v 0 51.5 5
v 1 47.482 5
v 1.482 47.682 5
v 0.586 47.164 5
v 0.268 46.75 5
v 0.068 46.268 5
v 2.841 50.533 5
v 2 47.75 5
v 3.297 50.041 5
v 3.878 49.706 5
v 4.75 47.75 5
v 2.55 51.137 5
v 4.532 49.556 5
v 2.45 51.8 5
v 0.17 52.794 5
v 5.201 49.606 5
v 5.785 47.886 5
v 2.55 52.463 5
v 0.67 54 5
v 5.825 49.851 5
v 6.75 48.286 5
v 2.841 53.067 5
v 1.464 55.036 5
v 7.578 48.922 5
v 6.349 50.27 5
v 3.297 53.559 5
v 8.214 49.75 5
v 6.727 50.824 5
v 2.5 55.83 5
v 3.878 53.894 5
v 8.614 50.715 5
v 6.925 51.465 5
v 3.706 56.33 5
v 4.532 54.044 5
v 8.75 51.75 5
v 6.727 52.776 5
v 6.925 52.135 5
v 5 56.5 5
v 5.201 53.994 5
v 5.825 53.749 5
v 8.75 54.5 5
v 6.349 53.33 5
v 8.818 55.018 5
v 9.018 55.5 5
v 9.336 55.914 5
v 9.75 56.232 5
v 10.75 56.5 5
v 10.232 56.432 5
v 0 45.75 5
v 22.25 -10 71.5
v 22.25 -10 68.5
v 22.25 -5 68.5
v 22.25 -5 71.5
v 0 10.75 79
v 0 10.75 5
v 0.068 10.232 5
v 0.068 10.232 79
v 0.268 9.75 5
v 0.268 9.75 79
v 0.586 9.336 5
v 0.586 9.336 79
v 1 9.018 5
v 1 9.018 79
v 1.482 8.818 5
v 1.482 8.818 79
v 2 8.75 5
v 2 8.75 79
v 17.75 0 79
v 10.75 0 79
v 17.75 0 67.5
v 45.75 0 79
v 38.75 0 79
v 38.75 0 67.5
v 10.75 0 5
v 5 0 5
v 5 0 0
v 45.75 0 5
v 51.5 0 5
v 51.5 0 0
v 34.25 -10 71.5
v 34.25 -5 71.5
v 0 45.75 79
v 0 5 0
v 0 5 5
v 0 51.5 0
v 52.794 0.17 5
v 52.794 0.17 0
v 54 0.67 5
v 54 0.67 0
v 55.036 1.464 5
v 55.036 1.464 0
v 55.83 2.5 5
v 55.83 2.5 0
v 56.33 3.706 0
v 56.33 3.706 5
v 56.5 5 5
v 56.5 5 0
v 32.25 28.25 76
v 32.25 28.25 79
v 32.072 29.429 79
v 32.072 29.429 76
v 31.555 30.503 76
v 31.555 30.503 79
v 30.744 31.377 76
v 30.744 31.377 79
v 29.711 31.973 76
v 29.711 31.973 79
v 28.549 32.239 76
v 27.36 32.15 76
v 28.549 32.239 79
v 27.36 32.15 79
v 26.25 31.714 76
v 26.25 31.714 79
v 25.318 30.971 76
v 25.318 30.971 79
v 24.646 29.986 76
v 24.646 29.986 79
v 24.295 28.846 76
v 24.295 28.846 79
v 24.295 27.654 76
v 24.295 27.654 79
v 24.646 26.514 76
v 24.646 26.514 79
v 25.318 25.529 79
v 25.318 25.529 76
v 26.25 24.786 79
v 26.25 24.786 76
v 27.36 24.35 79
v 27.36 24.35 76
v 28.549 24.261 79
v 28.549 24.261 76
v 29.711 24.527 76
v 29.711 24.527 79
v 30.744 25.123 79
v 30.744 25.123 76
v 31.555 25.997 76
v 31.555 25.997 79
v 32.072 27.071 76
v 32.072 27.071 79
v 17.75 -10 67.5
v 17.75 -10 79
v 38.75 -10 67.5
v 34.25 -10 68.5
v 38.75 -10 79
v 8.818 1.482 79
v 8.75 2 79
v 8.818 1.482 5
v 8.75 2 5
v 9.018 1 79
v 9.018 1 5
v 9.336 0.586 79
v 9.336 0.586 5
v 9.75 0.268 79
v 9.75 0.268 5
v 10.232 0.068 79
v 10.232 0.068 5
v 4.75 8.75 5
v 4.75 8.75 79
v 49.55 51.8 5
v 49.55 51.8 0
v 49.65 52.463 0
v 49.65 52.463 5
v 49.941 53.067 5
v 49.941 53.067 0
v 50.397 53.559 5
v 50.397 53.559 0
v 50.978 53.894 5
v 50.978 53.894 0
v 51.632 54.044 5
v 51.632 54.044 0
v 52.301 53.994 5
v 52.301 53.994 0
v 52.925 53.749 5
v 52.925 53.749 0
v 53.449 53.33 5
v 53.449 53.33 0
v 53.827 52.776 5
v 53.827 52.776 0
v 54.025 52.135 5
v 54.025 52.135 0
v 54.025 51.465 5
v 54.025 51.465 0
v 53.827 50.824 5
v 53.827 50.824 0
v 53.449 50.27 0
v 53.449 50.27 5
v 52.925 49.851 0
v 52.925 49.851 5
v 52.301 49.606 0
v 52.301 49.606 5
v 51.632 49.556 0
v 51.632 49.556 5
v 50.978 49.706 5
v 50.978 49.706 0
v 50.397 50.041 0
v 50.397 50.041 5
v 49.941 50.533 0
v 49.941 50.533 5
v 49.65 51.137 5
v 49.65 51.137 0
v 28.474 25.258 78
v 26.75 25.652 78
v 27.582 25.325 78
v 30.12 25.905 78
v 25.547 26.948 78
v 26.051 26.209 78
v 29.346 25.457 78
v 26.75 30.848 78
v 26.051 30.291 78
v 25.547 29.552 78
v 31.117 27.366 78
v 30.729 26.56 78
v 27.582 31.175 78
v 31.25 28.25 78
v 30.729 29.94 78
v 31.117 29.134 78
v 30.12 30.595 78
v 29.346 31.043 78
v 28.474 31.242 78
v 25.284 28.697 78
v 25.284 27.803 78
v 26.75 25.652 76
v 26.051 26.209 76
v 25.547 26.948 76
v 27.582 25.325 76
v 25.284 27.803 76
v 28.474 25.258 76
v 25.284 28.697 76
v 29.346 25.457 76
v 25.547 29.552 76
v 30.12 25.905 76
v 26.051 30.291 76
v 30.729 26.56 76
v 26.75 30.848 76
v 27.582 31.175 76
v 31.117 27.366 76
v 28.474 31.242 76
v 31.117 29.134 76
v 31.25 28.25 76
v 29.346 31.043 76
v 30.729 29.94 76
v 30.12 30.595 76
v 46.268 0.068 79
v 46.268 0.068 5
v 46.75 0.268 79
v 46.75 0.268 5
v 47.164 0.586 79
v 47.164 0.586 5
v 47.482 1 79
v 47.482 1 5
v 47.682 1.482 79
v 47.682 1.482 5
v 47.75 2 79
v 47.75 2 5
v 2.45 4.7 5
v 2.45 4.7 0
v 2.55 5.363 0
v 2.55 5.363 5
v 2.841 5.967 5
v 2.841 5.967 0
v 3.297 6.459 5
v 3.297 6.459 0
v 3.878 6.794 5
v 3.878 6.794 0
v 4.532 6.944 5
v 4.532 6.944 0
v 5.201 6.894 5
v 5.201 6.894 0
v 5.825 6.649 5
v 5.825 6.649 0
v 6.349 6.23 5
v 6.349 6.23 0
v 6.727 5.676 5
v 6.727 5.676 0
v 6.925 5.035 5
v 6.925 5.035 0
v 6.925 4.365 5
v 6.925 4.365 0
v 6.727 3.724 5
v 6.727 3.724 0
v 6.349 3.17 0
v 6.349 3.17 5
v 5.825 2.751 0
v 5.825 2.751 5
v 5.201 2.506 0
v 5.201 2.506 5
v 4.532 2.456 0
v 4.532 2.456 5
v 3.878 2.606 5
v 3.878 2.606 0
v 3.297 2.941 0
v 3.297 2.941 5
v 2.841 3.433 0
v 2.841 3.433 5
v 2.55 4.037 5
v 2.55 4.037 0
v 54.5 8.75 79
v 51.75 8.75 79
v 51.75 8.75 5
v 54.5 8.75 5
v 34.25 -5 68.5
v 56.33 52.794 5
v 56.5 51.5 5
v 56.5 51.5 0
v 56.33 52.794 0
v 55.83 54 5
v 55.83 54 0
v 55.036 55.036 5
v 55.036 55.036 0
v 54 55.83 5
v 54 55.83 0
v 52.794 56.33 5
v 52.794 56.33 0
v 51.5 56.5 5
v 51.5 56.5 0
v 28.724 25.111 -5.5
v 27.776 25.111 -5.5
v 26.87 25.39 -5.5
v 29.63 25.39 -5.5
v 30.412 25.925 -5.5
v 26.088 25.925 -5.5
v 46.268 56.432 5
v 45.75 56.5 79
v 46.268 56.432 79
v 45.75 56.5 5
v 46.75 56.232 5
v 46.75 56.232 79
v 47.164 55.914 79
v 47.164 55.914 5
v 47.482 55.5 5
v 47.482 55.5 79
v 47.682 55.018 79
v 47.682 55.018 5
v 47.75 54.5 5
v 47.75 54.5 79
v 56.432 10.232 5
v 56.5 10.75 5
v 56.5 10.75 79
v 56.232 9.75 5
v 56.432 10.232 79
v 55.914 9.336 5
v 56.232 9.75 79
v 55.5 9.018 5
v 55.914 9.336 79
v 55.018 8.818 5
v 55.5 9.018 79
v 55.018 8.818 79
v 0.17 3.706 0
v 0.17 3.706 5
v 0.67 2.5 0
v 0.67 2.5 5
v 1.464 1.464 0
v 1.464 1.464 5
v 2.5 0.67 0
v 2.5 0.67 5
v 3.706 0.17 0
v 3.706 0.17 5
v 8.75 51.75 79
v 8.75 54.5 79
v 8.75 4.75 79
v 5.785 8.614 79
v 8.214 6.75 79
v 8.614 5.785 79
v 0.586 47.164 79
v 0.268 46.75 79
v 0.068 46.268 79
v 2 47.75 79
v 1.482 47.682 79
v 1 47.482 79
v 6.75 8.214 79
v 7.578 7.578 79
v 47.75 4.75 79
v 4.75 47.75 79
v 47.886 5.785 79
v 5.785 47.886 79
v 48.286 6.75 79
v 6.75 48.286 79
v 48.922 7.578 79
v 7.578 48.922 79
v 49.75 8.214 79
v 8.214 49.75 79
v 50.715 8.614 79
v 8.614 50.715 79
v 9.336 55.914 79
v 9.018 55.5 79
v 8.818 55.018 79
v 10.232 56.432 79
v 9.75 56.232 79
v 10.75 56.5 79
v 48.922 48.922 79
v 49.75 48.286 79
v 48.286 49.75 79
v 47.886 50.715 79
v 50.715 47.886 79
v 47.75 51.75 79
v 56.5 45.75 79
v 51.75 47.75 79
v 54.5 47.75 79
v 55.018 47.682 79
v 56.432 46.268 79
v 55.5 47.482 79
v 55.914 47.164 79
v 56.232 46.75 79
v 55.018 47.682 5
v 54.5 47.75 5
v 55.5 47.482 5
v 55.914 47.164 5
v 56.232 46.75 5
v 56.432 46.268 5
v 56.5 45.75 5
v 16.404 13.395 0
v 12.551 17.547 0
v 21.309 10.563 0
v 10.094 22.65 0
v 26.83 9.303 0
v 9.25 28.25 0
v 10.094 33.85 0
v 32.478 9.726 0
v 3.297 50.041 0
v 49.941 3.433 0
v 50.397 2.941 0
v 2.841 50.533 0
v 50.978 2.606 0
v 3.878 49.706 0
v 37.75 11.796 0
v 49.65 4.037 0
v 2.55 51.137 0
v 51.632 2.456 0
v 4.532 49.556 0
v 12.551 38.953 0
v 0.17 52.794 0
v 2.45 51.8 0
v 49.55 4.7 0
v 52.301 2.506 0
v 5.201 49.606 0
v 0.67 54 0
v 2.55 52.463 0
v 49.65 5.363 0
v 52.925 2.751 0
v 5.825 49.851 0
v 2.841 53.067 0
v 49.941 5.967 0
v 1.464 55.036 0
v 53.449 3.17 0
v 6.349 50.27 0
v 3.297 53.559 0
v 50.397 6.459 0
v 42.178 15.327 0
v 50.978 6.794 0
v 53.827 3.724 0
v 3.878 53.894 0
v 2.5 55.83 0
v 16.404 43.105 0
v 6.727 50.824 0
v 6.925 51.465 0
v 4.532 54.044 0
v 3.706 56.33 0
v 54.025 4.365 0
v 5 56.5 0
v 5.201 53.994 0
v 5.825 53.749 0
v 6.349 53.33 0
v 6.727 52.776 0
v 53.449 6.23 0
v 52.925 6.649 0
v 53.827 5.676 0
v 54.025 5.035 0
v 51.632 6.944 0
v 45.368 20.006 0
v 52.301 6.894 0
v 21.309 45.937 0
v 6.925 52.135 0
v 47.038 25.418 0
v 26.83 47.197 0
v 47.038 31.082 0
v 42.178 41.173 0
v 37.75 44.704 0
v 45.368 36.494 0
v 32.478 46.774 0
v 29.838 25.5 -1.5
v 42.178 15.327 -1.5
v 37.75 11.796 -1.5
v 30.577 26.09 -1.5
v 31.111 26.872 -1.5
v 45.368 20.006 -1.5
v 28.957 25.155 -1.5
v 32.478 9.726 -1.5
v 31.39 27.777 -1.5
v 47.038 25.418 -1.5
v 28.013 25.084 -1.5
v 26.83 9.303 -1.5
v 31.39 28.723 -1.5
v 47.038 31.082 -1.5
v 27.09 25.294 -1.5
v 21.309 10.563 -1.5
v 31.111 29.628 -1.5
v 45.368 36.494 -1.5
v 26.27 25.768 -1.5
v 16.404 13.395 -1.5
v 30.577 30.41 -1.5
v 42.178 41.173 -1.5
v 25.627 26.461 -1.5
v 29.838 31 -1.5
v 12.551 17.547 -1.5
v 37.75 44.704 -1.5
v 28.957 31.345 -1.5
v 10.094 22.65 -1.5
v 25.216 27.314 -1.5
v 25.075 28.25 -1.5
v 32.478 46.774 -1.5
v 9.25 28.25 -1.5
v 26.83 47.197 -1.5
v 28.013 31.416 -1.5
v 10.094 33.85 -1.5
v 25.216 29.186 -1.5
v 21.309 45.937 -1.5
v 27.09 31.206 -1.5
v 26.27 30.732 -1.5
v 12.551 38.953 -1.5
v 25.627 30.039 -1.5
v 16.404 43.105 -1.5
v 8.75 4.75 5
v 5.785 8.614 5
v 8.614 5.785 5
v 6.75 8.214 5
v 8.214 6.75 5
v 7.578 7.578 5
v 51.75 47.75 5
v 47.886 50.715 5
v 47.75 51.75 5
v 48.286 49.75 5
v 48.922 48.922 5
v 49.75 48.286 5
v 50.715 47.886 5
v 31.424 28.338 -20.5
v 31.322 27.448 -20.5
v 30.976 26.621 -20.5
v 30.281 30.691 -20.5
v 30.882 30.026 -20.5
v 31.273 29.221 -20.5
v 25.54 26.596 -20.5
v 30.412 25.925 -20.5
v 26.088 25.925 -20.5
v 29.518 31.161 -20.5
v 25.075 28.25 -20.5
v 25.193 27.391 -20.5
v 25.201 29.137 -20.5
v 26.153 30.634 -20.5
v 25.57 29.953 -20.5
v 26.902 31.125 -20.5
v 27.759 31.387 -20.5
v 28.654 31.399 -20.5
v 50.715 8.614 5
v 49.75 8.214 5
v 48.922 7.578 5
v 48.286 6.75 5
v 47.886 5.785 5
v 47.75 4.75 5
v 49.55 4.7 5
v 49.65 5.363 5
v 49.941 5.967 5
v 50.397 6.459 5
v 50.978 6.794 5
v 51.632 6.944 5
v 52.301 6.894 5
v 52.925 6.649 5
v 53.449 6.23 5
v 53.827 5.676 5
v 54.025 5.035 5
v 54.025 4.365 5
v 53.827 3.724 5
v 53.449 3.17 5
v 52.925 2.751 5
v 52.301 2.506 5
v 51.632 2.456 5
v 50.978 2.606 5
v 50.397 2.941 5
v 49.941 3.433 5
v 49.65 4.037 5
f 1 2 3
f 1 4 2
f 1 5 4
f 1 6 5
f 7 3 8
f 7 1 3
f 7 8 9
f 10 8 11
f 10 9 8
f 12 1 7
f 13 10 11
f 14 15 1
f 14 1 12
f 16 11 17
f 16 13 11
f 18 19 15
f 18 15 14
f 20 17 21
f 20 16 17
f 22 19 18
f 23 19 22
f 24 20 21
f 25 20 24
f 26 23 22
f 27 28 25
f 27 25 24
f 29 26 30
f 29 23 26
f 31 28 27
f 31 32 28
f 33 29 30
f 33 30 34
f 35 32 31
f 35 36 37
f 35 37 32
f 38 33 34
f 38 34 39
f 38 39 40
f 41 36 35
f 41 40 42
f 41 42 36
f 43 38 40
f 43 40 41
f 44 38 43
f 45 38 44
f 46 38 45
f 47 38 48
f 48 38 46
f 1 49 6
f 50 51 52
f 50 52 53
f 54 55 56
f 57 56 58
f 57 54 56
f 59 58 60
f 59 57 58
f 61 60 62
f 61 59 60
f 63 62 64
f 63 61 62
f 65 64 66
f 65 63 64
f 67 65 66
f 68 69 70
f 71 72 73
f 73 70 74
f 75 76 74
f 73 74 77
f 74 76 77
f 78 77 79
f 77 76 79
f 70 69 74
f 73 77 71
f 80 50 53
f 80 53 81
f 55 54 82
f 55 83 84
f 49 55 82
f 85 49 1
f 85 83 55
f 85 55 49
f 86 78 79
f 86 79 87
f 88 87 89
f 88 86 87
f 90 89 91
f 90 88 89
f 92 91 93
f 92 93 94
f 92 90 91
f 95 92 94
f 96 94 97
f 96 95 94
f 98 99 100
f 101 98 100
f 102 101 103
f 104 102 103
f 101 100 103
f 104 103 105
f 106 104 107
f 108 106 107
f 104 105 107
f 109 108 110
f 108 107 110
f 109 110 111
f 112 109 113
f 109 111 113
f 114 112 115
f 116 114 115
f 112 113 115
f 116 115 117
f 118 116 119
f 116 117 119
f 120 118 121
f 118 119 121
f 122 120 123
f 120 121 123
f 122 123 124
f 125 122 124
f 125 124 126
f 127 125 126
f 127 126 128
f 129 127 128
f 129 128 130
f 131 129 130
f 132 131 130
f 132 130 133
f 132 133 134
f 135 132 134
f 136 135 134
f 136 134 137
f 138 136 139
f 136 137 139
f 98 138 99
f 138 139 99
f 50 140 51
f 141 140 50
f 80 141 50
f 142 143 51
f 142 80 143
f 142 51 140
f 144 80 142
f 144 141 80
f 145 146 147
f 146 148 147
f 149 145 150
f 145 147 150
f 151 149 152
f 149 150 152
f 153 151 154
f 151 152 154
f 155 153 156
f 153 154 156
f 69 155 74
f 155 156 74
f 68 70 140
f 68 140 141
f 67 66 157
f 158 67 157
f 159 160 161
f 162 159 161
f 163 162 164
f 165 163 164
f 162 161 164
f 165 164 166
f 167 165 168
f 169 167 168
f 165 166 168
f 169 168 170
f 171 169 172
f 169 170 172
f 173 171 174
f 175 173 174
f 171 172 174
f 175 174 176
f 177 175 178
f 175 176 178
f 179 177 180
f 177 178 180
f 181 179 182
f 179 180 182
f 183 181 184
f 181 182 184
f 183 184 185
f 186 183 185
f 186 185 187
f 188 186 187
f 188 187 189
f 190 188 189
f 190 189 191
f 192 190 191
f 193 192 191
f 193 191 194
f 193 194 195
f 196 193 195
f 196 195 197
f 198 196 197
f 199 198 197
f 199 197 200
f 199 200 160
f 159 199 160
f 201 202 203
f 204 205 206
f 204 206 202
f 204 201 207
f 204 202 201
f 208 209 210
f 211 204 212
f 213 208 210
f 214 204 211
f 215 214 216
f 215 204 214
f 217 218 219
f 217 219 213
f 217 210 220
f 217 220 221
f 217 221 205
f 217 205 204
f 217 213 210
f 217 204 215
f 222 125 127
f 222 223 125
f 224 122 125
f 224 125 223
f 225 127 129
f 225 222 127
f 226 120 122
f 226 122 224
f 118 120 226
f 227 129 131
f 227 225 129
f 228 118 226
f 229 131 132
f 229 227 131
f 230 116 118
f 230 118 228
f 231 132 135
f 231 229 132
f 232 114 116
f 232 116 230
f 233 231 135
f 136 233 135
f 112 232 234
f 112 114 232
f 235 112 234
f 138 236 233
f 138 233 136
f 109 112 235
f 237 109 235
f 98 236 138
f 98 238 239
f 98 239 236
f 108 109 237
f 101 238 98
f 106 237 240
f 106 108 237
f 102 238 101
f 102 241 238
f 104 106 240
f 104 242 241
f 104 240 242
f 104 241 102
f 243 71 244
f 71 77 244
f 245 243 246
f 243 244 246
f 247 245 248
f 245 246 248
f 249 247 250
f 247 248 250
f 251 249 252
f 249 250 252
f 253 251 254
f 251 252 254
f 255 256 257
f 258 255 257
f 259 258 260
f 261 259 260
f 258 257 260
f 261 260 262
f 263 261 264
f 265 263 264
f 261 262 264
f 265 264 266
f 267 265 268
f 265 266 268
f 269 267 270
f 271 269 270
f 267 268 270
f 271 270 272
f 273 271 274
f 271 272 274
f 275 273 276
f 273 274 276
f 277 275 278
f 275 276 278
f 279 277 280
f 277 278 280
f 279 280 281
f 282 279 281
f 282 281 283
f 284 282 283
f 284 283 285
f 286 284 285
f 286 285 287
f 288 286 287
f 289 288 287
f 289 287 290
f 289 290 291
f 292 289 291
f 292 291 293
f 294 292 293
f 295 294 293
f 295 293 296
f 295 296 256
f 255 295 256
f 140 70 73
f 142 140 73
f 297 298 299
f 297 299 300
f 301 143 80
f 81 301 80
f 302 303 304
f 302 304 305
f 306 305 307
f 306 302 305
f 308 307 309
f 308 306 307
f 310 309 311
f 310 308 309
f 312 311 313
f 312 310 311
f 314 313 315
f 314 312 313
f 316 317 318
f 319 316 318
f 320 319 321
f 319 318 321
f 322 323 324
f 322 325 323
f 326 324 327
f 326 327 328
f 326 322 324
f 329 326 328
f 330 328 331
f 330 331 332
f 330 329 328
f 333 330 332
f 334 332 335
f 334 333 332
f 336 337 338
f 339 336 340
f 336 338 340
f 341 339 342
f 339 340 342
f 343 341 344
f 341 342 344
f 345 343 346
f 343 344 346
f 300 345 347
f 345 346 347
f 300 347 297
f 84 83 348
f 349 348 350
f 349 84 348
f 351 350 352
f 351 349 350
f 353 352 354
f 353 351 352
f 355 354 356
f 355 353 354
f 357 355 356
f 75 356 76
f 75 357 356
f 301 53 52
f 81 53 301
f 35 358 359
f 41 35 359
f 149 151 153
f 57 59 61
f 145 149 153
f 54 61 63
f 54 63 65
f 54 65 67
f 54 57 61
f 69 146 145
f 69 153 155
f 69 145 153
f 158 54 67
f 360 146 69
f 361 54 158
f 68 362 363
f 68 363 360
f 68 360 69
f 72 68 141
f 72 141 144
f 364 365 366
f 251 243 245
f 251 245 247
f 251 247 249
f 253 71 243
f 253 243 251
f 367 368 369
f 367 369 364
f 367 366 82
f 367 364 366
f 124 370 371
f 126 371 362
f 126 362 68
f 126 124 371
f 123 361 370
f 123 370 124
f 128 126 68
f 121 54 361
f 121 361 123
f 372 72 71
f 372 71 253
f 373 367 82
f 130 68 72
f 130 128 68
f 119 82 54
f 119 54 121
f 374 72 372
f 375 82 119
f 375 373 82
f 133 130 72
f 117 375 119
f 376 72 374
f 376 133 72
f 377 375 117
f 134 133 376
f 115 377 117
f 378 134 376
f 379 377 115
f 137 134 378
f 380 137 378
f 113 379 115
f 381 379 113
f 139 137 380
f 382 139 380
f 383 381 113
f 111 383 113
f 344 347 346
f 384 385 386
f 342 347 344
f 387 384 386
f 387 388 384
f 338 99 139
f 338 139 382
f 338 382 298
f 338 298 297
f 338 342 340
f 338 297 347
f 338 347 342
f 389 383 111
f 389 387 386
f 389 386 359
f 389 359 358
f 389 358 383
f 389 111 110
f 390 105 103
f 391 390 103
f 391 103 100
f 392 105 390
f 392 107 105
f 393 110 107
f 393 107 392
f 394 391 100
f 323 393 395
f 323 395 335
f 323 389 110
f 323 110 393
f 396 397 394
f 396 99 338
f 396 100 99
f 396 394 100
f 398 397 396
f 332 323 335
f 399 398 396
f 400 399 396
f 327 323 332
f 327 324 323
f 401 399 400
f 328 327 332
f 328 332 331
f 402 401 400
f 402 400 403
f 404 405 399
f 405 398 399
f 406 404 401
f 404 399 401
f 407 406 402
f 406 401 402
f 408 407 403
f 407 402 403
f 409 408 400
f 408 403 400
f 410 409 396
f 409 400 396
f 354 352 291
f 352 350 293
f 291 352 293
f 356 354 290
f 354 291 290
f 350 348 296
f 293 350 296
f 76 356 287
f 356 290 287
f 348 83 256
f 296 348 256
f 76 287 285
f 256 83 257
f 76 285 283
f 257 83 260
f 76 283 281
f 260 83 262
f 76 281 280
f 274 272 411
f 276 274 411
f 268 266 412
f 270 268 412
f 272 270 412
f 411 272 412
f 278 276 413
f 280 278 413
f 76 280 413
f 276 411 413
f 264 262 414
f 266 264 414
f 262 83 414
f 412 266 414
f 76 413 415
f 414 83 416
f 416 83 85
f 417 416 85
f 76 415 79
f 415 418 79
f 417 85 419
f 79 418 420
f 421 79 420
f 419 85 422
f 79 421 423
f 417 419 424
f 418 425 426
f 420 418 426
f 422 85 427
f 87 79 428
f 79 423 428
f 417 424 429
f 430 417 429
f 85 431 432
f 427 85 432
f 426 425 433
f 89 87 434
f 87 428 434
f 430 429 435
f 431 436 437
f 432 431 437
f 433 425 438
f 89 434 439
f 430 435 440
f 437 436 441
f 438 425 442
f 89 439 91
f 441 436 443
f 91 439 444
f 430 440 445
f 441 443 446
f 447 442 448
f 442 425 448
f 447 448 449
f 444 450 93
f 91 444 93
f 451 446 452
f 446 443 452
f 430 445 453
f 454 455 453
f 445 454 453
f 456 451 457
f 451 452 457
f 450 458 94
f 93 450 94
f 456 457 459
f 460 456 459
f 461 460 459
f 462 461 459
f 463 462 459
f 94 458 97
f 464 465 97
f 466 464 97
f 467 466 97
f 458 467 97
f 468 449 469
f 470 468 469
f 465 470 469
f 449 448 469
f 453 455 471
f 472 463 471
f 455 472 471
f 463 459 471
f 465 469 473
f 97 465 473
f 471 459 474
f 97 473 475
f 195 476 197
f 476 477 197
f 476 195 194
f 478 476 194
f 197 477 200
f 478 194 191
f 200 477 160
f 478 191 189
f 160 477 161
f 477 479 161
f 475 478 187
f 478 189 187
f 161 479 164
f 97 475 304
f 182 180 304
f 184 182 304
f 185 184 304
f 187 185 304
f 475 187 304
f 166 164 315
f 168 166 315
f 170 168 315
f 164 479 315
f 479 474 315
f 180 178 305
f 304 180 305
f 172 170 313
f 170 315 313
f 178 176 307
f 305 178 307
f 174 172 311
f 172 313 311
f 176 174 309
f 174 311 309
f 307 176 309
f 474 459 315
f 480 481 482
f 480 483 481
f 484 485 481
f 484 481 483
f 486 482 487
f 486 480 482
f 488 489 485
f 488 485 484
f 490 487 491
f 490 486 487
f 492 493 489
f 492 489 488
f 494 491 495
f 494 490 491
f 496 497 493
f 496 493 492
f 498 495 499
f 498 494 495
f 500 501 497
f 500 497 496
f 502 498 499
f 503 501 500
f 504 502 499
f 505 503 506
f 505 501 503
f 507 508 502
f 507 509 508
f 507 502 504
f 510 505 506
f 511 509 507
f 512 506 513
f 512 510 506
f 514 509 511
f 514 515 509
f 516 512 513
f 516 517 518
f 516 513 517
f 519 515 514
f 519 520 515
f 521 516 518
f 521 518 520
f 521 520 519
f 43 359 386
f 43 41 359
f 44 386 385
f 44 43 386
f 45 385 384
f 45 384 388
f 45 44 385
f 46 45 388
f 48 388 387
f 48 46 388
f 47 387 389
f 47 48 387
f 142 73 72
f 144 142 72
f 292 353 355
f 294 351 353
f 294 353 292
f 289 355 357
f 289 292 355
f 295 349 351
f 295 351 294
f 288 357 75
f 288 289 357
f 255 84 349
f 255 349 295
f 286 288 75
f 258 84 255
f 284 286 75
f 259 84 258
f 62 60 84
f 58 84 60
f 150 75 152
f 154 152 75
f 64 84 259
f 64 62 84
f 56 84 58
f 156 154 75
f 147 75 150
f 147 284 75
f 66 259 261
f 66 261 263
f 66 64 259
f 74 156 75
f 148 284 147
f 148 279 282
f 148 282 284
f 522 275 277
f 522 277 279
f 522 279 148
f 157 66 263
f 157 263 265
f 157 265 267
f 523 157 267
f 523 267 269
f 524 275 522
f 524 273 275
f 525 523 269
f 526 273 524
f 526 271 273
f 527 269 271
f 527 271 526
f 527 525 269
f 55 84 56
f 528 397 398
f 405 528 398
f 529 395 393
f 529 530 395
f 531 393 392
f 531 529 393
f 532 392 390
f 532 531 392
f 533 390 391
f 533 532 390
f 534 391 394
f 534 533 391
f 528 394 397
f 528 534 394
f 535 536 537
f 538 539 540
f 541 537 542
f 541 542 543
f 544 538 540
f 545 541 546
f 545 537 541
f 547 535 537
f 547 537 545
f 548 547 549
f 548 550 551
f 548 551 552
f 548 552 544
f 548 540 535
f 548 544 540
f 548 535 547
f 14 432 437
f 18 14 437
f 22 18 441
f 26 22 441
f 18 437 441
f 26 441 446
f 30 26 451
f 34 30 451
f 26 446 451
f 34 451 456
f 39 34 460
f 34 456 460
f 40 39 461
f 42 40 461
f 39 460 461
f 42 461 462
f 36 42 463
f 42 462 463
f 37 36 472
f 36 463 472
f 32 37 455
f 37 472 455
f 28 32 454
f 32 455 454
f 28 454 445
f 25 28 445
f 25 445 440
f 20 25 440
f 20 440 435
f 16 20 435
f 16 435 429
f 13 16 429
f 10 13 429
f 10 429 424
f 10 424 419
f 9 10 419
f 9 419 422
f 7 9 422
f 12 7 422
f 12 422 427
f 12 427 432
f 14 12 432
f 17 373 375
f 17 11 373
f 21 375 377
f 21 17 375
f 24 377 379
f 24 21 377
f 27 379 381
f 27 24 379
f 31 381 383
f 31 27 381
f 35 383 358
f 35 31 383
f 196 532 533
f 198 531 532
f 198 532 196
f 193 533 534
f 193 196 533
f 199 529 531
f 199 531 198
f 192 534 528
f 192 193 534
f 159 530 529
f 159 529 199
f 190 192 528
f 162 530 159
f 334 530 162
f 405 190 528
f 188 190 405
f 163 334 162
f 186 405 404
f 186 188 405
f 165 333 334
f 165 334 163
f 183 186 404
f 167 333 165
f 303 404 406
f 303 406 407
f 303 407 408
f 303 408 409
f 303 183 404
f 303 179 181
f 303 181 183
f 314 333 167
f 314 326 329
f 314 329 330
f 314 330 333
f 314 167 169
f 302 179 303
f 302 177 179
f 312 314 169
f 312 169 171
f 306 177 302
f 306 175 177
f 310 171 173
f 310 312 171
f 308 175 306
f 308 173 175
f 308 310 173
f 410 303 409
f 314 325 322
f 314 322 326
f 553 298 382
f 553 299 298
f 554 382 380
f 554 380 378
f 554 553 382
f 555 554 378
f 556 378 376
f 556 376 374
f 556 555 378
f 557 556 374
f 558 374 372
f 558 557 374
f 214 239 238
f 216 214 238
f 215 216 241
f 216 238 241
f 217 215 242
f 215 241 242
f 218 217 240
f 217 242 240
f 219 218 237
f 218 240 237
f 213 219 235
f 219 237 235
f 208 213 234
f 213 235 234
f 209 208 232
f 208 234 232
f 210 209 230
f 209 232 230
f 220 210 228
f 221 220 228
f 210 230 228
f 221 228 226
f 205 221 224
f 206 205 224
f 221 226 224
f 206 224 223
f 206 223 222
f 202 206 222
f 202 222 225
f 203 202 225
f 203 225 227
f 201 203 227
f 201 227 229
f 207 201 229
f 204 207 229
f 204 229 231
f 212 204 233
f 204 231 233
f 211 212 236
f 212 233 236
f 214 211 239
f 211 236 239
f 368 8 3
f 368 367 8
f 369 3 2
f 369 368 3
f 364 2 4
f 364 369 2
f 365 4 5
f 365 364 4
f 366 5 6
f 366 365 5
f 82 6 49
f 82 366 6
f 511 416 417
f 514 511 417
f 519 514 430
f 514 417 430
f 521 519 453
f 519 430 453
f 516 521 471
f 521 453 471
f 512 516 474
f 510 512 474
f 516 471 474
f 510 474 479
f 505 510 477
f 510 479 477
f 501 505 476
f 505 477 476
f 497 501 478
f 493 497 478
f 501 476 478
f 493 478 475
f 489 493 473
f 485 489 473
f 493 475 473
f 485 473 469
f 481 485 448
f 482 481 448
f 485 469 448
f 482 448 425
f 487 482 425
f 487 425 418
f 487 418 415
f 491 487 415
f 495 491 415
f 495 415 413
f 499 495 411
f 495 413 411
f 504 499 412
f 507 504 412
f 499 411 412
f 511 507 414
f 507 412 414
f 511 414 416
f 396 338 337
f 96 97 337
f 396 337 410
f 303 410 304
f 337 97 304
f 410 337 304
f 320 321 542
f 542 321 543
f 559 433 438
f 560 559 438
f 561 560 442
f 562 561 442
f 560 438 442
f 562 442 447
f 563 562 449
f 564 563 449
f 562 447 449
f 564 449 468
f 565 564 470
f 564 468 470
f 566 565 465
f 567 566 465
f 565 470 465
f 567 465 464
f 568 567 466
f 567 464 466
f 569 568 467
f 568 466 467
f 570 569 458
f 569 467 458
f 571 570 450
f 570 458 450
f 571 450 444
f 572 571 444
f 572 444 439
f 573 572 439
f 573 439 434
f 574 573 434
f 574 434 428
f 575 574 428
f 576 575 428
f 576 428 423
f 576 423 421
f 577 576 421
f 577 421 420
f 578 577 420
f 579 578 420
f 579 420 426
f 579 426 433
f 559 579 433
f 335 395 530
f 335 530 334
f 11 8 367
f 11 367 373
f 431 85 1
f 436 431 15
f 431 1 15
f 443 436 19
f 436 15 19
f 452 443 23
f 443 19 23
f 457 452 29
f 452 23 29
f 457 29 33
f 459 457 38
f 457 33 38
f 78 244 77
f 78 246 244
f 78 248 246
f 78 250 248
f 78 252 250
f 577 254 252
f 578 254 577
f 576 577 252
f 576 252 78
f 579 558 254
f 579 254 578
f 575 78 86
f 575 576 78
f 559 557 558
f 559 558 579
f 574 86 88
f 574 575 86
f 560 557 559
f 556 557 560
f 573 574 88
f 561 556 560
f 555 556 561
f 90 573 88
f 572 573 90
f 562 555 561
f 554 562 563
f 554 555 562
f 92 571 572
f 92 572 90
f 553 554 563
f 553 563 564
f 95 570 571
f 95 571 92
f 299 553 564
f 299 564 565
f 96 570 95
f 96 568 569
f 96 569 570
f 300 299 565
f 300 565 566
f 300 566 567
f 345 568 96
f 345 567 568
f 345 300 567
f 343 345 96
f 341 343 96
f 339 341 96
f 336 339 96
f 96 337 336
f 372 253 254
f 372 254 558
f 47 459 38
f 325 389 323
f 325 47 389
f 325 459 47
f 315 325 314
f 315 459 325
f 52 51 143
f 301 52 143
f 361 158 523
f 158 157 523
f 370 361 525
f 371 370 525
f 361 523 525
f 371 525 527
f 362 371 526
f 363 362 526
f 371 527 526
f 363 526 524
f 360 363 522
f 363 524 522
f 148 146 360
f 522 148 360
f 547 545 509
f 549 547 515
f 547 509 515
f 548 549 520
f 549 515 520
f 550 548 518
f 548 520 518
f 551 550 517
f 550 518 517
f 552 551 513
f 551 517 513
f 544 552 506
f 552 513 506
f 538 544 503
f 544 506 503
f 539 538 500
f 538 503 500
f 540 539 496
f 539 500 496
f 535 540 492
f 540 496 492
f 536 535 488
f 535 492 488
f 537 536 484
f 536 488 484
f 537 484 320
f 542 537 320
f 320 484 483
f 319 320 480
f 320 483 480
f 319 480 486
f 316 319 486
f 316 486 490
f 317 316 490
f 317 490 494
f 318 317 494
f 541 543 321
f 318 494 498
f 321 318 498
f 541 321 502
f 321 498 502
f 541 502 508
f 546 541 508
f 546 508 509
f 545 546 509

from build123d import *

# Parameters (mm, degrees)
SKETCH_1_W          = 56.5
SKETCH_1_H          = 56.5
EXTRUDE_1_DEPTH     = 79
FILLET_1_R          = 5
SKETCH_2_W          = 27.937414654
SKETCH_2_H          = 17.525111135
CUT_EXTRUDE_1_DEPTH = 74
FILLET_2_R          = 4
FILLET_3_R          = 2
SKETCH_3_R          = 19
EXTRUDE_2_DEPTH     = 1.5
SKETCH_4_R          = 4
CUT_EXTRUDE_2_DEPTH = 3
SKETCH_5_R          = 3
EXTRUDE_3_DEPTH     = 2
SKETCH_6_R          = 3.175
EXTRUDE_4_DEPTH     = 19
SKETCH_7_R          = 2.25
CUT_EXTRUDE_3_DEPTH = 21
SKETCH_8_W          = 21
SKETCH_8_H          = 11.5
EXTRUDE_5_DEPTH     = 10
SKETCH_9_W          = 12
SKETCH_9_H          = 3
CUT_EXTRUDE_4_DEPTH = 5
SKETCH_10_W         = 15
SKETCH_10_H         = 3.472611371
CUT_EXTRUDE_6_DEPTH = 113.36325022


with BuildPart() as part:
    # 草图1 → 凸台-拉伸1 (new body)
    with BuildSketch(Plane.XY):
        with Locations((28.25, 28.25)):
            Rectangle(SKETCH_1_W, SKETCH_1_H)
    extrude(amount=EXTRUDE_1_DEPTH)

    # 圆角1
    fillet_1_edges = [part.edges().sort_by_distance(p)[0] for p in [
        (0, 56.5, 39.5),
        (56.5, 56.5, 39.5),
        (56.5, 0, 39.5),
        (0, 0, 39.5),
    ]]
    fillet(fillet_1_edges, radius=FILLET_1_R)

    # 草图2 → 切除-拉伸1 (cut)
    with BuildSketch(Plane.XY.offset(79)):
        with Locations((-5.218707327, 56.512555568)):
            Rectangle(SKETCH_2_W, SKETCH_2_H)
        with Locations((61.718707327, 56.512555568)):
            Rectangle(SKETCH_2_W, SKETCH_2_H)
        with Locations((61.718707327, -0.012555568)):
            Rectangle(SKETCH_2_W, SKETCH_2_H)
        with Locations((-5.218707327, -0.012555568)):
            Rectangle(SKETCH_2_W, SKETCH_2_H)
    extrude(amount=-CUT_EXTRUDE_1_DEPTH, mode=Mode.SUBTRACT)

    # 圆角2
    fillet_2_edges = [part.edges().sort_by_distance(p)[0] for p in [
        (8.75, 47.75, 42),
        (47.75, 47.75, 42),
        (47.75, 8.75, 42),
        (8.75, 8.75, 42),
    ]]
    fillet(fillet_2_edges, radius=FILLET_2_R)

    # 圆角3
    fillet_3_edges = [part.edges().sort_by_distance(p)[0] for p in [
        (8.75, 56.5, 42),
        (0, 47.75, 42),
        (56.5, 47.75, 42),
        (47.75, 56.5, 42),
        (47.75, 0, 42),
        (56.5, 8.75, 42),
        (0, 8.75, 42),
        (8.75, 0, 42),
    ]]
    fillet(fillet_3_edges, radius=FILLET_3_R)

    # 草图3 → 凸台-拉伸2 (add)
    with BuildSketch(Plane(origin=(0, 0, 0), x_dir=(-1, 0, 0), z_dir=(0, 0, -1))):
        with Locations((-28.25, 28.25)):
            Circle(SKETCH_3_R)
    extrude(amount=EXTRUDE_2_DEPTH)

    # 草图4 → 切除-拉伸2 (cut)
    with BuildSketch(Plane.XY.offset(79)):
        with Locations((28.25, 28.25)):
            Circle(SKETCH_4_R)
    extrude(amount=-CUT_EXTRUDE_2_DEPTH, mode=Mode.SUBTRACT)

    # 草图5 → 凸台-拉伸3 (add)
    with BuildSketch(Plane.XY.offset(76)):
        with Locations((28.25, 28.25)):
            Circle(SKETCH_5_R)
    extrude(amount=EXTRUDE_3_DEPTH)

    # 草图6 → 凸台-拉伸4 (add)
    with BuildSketch(Plane(origin=(0, 0, -1.5), x_dir=(-1, 0, 0), z_dir=(0, 0, -1))):
        with Locations((-28.25, 28.25)):
            Circle(SKETCH_6_R)
    extrude(amount=EXTRUDE_4_DEPTH)

    # 草图7 → 切除-拉伸3 (cut)
    with BuildSketch(Plane(origin=(0, 0, 0), x_dir=(-1, 0, 0), z_dir=(0, 0, -1))):
        with Locations((-51.8, 4.7)):
            Circle(SKETCH_7_R)
        with Locations((-4.7, 4.7)):
            Circle(SKETCH_7_R)
        with Locations((-4.7, 51.8)):
            Circle(SKETCH_7_R)
        with Locations((-51.8, 51.8)):
            Circle(SKETCH_7_R)
    extrude(amount=-CUT_EXTRUDE_3_DEPTH, mode=Mode.SUBTRACT)

    # 草图8 → 凸台-拉伸5 (add)
    with BuildSketch(Plane.XZ):
        with Locations((28.25, 73.25)):
            Rectangle(SKETCH_8_W, SKETCH_8_H)
    extrude(amount=EXTRUDE_5_DEPTH)

    # 草图9 → 切除-拉伸4 (cut)
    with BuildSketch(Plane.XZ.offset(10)):
        with Locations((28.25, 70)):
            Rectangle(SKETCH_9_W, SKETCH_9_H)
    extrude(amount=-CUT_EXTRUDE_4_DEPTH, mode=Mode.SUBTRACT)

    # 草图10 → 切除-拉伸6 (cut, through all)
    with BuildSketch(Plane(origin=(0, 0, 0), x_dir=(0, 0, -1), z_dir=(1, 0, 0))):
        with Locations((13, 24.188694315)):
            Rectangle(SKETCH_10_W, SKETCH_10_H)
    extrude(amount=CUT_EXTRUDE_6_DEPTH, mode=Mode.SUBTRACT)


solid = part.part
